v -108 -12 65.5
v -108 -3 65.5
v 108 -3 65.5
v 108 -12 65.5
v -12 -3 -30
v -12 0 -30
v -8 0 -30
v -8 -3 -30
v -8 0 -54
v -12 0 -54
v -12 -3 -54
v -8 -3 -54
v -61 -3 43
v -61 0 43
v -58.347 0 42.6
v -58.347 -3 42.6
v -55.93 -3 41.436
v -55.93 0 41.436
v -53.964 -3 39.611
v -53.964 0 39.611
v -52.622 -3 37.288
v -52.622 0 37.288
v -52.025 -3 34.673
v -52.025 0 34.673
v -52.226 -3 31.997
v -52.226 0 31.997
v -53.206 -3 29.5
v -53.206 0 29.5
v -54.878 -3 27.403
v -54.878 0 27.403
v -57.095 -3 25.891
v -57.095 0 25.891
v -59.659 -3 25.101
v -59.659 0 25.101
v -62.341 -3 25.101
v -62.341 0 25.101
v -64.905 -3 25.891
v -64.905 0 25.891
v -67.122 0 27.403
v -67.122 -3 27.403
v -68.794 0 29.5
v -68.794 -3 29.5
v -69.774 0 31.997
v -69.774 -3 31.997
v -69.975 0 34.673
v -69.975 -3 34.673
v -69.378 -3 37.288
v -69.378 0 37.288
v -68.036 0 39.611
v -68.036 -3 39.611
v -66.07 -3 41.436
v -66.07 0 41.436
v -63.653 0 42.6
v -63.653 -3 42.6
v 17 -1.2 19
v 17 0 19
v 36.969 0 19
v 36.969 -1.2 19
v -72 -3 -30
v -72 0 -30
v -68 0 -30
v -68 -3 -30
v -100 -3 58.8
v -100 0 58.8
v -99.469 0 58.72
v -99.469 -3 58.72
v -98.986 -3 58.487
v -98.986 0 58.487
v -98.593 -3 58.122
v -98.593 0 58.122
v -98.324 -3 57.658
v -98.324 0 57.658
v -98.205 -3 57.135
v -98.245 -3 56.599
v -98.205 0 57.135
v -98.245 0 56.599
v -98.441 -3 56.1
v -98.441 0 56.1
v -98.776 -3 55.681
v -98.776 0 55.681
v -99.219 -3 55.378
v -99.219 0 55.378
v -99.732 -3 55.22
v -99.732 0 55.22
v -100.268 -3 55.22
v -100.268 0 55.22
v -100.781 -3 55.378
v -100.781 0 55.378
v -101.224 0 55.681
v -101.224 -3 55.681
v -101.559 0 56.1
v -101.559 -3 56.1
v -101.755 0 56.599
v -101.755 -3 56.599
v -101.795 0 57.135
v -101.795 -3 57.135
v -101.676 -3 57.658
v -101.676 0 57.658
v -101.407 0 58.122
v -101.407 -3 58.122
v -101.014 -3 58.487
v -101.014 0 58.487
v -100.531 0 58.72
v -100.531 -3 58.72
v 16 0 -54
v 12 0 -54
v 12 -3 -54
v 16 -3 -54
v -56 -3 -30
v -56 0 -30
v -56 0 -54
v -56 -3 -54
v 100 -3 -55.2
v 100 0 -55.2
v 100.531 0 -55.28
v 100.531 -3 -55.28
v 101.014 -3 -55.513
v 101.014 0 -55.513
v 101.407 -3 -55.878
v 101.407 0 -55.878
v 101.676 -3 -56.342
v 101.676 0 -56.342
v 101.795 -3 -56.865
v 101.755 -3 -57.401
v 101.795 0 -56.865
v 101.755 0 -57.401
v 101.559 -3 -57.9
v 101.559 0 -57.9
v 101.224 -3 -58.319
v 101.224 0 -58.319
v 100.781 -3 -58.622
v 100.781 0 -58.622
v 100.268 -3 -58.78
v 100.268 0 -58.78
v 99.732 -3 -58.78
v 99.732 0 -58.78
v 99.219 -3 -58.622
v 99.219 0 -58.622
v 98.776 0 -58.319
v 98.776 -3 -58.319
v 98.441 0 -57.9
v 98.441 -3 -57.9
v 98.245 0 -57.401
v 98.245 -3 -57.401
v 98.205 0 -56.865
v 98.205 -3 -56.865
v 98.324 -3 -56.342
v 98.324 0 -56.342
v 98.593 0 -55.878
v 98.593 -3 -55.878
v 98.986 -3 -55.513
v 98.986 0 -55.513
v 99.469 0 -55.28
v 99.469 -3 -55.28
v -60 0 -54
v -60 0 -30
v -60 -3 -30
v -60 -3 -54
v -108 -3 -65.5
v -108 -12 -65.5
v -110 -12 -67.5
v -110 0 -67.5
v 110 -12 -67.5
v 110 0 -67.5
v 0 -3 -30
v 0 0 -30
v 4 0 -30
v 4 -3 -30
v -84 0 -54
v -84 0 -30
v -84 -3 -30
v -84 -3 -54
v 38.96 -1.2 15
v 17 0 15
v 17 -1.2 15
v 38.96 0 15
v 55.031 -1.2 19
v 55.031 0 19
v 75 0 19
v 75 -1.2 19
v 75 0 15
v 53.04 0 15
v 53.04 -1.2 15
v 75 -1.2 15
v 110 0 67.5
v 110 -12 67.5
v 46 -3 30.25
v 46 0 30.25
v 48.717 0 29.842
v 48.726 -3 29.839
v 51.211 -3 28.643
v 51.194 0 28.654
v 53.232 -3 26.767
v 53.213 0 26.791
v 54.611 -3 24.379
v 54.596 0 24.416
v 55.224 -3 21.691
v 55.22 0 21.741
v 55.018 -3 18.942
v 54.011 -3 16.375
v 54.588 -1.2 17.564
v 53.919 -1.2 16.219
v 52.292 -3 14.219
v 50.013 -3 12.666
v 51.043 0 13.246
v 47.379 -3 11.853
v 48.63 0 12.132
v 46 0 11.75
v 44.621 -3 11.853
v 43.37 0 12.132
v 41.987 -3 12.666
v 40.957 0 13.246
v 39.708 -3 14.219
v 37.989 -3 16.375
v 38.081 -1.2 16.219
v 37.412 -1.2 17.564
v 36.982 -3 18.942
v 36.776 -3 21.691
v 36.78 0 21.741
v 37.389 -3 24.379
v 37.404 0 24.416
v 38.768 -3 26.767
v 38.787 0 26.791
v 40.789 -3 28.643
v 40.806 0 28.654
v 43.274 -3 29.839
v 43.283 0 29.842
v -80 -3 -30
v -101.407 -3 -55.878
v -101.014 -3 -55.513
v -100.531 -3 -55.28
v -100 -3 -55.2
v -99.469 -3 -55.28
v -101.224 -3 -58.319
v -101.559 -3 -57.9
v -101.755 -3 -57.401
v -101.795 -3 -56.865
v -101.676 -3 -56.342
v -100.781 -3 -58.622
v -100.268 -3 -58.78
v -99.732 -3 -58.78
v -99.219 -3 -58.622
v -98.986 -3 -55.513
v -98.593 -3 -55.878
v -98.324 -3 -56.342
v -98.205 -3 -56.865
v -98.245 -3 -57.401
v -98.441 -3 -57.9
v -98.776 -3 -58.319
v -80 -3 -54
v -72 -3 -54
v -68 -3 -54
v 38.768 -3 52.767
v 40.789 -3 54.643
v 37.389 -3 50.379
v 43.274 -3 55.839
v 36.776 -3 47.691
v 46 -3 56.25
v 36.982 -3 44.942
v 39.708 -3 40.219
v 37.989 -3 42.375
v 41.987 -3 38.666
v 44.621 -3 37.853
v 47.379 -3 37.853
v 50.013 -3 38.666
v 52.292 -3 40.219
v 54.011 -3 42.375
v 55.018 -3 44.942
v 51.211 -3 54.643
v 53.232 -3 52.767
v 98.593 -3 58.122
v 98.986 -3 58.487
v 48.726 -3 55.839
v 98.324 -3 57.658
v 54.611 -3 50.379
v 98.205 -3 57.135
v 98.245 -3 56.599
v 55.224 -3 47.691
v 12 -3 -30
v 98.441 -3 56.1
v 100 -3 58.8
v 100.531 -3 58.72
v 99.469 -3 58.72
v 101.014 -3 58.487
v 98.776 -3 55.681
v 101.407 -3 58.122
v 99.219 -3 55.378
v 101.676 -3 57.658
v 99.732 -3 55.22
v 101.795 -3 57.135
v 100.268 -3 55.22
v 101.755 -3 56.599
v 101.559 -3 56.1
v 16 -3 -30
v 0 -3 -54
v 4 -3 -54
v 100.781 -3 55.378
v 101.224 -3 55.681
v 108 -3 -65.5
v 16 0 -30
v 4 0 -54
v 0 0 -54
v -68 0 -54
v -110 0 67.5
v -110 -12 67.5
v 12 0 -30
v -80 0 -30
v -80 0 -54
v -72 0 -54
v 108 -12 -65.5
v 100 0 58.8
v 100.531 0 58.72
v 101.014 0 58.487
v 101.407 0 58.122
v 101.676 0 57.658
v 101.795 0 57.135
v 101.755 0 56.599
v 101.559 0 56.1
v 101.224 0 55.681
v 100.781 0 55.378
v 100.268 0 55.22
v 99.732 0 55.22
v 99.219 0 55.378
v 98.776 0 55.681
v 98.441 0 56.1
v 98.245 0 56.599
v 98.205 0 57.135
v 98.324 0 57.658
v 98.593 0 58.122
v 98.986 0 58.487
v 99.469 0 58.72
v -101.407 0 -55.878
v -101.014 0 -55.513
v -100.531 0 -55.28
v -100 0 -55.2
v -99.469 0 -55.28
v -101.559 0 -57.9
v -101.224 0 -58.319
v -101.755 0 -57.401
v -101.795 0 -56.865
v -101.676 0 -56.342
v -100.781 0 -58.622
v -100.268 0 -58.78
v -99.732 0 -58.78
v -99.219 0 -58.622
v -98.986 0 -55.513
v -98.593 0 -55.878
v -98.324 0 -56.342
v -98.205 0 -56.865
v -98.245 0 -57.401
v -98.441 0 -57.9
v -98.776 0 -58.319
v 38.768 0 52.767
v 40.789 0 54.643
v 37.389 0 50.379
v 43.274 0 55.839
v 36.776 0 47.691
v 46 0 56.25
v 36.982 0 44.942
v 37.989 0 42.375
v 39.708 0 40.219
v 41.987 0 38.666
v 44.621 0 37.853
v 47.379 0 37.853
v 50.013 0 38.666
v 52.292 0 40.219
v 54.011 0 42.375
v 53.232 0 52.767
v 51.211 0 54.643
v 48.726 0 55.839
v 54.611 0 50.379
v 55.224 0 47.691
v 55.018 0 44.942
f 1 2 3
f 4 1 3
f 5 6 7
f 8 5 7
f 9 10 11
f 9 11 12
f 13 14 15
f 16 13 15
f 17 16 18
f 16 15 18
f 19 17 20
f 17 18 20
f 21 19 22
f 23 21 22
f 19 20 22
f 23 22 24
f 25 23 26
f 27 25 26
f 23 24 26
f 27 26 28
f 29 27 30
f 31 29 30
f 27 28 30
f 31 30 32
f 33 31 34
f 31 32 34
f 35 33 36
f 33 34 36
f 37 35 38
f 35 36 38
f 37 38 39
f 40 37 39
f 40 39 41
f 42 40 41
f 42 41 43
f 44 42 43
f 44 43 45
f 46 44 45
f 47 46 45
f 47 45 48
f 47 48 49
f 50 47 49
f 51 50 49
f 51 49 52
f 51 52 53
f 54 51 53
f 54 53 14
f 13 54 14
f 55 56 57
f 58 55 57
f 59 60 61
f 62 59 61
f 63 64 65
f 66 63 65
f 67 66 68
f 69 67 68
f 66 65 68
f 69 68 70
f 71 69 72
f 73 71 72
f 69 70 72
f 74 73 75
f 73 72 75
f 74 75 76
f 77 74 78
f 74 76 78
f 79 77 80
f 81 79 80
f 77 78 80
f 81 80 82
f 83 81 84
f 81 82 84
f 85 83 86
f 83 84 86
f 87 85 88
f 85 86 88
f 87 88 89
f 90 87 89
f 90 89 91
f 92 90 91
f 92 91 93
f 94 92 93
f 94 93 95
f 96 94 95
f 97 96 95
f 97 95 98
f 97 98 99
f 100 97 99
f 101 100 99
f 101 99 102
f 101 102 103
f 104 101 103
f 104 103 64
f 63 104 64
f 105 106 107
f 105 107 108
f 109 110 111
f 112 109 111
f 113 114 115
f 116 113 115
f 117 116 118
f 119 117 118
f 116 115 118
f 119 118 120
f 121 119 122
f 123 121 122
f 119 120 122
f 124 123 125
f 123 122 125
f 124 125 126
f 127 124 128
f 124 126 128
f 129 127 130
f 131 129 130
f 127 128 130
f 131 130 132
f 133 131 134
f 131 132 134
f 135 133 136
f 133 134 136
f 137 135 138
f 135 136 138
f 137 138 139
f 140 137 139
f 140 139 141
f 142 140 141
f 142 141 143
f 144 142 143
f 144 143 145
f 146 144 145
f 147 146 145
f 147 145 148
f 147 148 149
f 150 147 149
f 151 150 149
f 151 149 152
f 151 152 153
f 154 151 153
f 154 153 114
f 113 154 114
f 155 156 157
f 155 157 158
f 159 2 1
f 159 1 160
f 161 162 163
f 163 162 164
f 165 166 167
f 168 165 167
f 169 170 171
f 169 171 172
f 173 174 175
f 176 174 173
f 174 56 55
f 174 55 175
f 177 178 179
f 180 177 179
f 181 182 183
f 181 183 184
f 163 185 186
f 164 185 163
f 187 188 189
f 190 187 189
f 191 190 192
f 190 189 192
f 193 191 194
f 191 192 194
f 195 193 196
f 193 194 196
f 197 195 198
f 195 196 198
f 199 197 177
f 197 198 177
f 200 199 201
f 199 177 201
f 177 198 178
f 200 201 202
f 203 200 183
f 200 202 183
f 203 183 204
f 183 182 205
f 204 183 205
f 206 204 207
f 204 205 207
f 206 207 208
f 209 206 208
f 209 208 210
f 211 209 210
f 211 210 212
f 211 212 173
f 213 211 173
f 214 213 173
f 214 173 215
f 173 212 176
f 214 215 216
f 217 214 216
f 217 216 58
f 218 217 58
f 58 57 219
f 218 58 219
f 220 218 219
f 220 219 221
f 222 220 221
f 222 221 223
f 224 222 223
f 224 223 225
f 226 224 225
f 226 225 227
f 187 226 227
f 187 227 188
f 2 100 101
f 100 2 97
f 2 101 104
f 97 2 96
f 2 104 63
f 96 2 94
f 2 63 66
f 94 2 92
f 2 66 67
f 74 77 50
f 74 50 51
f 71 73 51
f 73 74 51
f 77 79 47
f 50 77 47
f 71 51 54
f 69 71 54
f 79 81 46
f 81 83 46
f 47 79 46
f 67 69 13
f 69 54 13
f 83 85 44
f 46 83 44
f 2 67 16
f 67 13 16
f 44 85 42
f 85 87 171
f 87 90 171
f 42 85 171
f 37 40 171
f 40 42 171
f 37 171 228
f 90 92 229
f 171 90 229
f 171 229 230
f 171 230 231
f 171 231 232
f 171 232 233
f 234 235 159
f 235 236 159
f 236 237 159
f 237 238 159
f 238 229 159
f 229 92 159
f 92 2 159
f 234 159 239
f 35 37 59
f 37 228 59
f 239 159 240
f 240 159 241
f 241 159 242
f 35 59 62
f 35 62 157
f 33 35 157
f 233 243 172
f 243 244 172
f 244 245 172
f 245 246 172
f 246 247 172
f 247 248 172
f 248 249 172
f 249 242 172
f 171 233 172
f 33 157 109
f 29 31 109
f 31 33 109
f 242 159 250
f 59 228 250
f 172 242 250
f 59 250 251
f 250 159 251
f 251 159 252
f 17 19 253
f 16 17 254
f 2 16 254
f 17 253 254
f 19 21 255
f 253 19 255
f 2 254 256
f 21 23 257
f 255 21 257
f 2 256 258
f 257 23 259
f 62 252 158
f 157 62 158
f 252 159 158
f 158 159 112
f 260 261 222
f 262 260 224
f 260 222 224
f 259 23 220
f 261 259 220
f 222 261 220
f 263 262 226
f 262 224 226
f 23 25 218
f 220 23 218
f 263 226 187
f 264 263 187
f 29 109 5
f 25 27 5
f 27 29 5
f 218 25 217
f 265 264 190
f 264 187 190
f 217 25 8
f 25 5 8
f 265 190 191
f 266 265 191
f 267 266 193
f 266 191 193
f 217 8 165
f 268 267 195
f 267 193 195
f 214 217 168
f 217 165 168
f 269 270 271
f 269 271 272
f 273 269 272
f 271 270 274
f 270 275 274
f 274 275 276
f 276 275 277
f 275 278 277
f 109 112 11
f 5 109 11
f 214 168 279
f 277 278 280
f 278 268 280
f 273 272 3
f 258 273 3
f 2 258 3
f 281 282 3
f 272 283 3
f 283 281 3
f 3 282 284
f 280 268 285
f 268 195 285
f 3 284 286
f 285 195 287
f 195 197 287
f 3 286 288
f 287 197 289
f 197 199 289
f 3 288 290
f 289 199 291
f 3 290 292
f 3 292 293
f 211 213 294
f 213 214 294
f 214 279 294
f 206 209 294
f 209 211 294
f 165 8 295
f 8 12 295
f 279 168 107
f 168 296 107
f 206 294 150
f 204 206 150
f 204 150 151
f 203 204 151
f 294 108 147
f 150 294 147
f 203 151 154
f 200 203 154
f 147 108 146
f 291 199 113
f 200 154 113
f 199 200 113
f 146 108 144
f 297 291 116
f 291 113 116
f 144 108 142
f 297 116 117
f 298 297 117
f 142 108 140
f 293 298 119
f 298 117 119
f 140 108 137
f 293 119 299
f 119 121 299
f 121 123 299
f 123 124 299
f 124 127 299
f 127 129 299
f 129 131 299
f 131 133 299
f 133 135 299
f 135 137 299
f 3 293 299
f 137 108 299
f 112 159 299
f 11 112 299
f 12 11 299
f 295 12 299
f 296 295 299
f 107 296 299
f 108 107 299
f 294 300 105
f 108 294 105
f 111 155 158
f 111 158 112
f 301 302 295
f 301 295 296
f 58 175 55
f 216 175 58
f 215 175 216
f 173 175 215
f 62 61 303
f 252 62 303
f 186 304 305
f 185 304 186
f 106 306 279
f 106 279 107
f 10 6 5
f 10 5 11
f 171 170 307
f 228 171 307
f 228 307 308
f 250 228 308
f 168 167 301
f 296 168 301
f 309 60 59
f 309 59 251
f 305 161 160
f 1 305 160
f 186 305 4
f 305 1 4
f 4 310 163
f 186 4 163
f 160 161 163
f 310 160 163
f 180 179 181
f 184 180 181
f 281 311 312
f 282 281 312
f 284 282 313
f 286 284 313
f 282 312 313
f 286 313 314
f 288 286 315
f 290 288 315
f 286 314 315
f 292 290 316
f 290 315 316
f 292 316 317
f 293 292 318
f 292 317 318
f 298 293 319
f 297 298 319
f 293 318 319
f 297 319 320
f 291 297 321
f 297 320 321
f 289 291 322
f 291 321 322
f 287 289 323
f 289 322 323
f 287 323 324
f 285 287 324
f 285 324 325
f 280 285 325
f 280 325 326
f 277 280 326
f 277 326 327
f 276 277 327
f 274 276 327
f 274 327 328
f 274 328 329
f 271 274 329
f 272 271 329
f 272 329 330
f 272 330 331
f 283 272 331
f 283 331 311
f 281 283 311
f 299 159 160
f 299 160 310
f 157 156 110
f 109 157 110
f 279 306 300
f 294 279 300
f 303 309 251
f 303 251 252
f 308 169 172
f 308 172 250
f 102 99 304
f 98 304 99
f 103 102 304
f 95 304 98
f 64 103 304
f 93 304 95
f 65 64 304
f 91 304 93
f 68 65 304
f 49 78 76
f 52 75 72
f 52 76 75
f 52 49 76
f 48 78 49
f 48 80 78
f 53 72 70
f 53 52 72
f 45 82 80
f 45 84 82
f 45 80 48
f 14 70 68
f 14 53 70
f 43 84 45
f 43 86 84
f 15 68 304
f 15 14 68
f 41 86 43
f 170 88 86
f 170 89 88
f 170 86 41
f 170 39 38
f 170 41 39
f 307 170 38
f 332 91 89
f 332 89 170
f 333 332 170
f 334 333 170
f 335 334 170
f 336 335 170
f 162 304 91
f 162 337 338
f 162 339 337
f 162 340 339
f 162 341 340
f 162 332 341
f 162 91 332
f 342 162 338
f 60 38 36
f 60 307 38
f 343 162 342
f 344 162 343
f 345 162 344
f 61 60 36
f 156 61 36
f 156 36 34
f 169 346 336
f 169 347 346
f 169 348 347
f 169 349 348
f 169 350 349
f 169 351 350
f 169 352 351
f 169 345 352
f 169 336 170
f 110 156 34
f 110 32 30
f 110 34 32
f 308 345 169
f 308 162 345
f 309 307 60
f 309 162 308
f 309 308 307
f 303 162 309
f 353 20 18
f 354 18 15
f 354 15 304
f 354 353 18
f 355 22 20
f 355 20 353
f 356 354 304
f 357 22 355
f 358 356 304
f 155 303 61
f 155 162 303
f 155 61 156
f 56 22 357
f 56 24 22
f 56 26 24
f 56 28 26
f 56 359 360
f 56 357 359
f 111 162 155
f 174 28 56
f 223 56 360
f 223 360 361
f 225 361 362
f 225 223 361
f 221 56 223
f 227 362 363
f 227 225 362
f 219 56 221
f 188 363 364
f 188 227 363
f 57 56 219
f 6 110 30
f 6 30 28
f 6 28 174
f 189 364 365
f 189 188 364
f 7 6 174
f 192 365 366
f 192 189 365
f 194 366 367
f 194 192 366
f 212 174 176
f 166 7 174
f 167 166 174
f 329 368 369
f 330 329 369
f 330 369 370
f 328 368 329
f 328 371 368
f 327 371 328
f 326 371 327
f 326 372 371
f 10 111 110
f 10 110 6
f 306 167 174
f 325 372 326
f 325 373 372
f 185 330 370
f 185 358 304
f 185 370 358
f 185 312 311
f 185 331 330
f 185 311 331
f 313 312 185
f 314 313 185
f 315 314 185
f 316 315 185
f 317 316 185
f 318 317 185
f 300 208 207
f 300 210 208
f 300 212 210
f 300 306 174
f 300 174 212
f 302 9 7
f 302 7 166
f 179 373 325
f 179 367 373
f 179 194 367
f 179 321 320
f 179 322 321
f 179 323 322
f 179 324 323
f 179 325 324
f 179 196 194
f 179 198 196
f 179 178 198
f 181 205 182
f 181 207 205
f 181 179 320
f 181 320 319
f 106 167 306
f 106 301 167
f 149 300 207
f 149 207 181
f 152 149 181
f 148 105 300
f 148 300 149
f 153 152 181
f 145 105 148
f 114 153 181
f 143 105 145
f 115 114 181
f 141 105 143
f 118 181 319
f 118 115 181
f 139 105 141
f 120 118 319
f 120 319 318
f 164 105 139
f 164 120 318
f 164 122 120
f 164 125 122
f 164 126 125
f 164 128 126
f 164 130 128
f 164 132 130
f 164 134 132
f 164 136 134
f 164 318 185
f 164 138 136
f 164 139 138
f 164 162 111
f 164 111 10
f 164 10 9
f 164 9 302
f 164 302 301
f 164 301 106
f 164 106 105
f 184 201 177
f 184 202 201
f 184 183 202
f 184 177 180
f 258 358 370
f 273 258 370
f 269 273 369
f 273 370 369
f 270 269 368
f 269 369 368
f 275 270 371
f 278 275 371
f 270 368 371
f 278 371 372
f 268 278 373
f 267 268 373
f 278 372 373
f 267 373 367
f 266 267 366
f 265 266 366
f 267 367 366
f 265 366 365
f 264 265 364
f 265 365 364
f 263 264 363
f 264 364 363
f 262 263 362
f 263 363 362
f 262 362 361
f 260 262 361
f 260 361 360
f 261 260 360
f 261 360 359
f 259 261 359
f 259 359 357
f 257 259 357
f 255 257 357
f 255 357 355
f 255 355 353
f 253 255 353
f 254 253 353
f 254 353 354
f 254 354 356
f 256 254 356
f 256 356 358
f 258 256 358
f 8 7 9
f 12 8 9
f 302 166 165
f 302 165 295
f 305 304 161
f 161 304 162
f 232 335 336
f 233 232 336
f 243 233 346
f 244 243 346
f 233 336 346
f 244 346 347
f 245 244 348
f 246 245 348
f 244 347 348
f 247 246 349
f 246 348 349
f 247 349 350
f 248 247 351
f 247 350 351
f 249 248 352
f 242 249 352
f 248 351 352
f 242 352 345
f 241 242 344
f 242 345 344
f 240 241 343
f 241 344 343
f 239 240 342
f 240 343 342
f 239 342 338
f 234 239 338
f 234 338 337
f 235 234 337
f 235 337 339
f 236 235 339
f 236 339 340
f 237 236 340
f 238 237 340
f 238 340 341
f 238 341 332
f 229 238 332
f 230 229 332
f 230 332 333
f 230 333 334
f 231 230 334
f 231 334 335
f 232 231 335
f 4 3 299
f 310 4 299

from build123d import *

# Parameters (mm, degrees)
SKETCH_1_W                       = 220
SKETCH_1_H                       = 135
LID_TOP_3MM_DEPTH                = 3
SKETCH_2_W                       = 216
SKETCH_2_H                       = 2
LID_RIM_BACK_DEPTH               = 12
SKETCH_3_W                       = 216
SKETCH_3_H                       = 2
LID_RIM_FRONT_DEPTH              = 12
SKETCH_4_W                       = 2
SKETCH_4_H                       = 135
LID_RIM_LEFT_DEPTH               = 12
SKETCH_5_W                       = 2
SKETCH_5_H                       = 135
LID_RIM_RIGHT_DEPTH              = 12
SKETCH_6_R                       = 1.8
LID_SCREW_CLEARANCE_1_DEPTH      = 16
SKETCH_7_R                       = 1.8
LID_SCREW_CLEARANCE_2_DEPTH      = 16
SKETCH_8_R                       = 1.8
LID_SCREW_CLEARANCE_3_DEPTH      = 16
SKETCH_9_R                       = 1.8
LID_SCREW_CLEARANCE_4_DEPTH      = 16
SKETCH_10_R                      = 9
OV5647_LENS_OPENING_D18_DEPTH    = 4
SKETCH_11_R                      = 9.25
HC_SR04_ACOUSTIC_OPENING_1_DEPTH = 4
SKETCH_12_R                      = 9.25
HC_SR04_ACOUSTIC_OPENING_2_DEPTH = 4
SKETCH_13_W                      = 58
SKETCH_13_H                      = 4
HC_SR04_ALIGNMENT_RECESS_DEPTH   = 1.2
SKETCH_14_W                      = 4
SKETCH_14_H                      = 24
VENT_SLOT_1_DEPTH                = 4
SKETCH_15_W                      = 4
SKETCH_15_H                      = 24
VENT_SLOT_2_DEPTH                = 4
SKETCH_16_W                      = 4
SKETCH_16_H                      = 24
VENT_SLOT_3_DEPTH                = 4
SKETCH_17_W                      = 4
SKETCH_17_H                      = 24
VENT_SLOT_4_DEPTH                = 4
SKETCH_18_W                      = 4
SKETCH_18_H                      = 24
VENT_SLOT_5_DEPTH                = 4
SKETCH_19_W                      = 4
SKETCH_19_H                      = 24
VENT_SLOT_6_DEPTH                = 4


with BuildPart() as part:
    # 草图1 → Lid_Top_3mm (new body)
    with BuildSketch(Plane(origin=(0, 0, 0), x_dir=(1, 0, 0), z_dir=(0, 1, 0))):
        Rectangle(SKETCH_1_W, SKETCH_1_H)
    extrude(amount=-LID_TOP_3MM_DEPTH)

    # 草图2 → Lid_Rim_Back (add)
    with BuildSketch(Plane(origin=(0, 0, 0), x_dir=(1, 0, 0), z_dir=(0, 1, 0))):
        with Locations((0, 66.5)):
            Rectangle(SKETCH_2_W, SKETCH_2_H)
    extrude(amount=-LID_RIM_BACK_DEPTH)

    # 草图3 → Lid_Rim_Front (add)
    with BuildSketch(Plane(origin=(0, 0, 0), x_dir=(1, 0, 0), z_dir=(0, 1, 0))):
        with Locations((0, -66.5)):
            Rectangle(SKETCH_3_W, SKETCH_3_H)
    extrude(amount=-LID_RIM_FRONT_DEPTH)

    # 草图4 → Lid_Rim_Left (add)
    with BuildSketch(Plane(origin=(0, 0, 0), x_dir=(1, 0, 0), z_dir=(0, 1, 0))):
        with Locations((-109, 0)):
            Rectangle(SKETCH_4_W, SKETCH_4_H)
    extrude(amount=-LID_RIM_LEFT_DEPTH)

    # 草图5 → Lid_Rim_Right (add)
    with BuildSketch(Plane(origin=(0, 0, 0), x_dir=(1, 0, 0), z_dir=(0, 1, 0))):
        with Locations((109, 0)):
            Rectangle(SKETCH_5_W, SKETCH_5_H)
    extrude(amount=-LID_RIM_RIGHT_DEPTH)

    # 草图6 → Lid_Screw_Clearance_1 (cut)
    with BuildSketch(Plane(origin=(0, 0, 0), x_dir=(1, 0, 0), z_dir=(0, 1, 0))):
        with Locations(Location((-100, -57, 0), (0, 0, 270))):
            Circle(SKETCH_6_R)
    extrude(amount=-LID_SCREW_CLEARANCE_1_DEPTH, mode=Mode.SUBTRACT)

    # 草图7 → Lid_Screw_Clearance_2 (cut)
    with BuildSketch(Plane(origin=(0, 0, 0), x_dir=(1, 0, 0), z_dir=(0, 1, 0))):
        with Locations(Location((100, -57, 0), (0, 0, 270))):
            Circle(SKETCH_7_R)
    extrude(amount=-LID_SCREW_CLEARANCE_2_DEPTH, mode=Mode.SUBTRACT)

    # 草图8 → Lid_Screw_Clearance_3 (cut)
    with BuildSketch(Plane(origin=(0, 0, 0), x_dir=(1, 0, 0), z_dir=(0, 1, 0))):
        with Locations(Location((-100, 57, 0), (0, 0, 270))):
            Circle(SKETCH_8_R)
    extrude(amount=-LID_SCREW_CLEARANCE_3_DEPTH, mode=Mode.SUBTRACT)

    # 草图9 → Lid_Screw_Clearance_4 (cut)
    with BuildSketch(Plane(origin=(0, 0, 0), x_dir=(1, 0, 0), z_dir=(0, 1, 0))):
        with Locations(Location((100, 57, 0), (0, 0, 270))):
            Circle(SKETCH_9_R)
    extrude(amount=-LID_SCREW_CLEARANCE_4_DEPTH, mode=Mode.SUBTRACT)

    # 草图10 → OV5647_Lens_Opening_D18 (cut)
    with BuildSketch(Plane(origin=(0, 0, 0), x_dir=(1, 0, 0), z_dir=(0, 1, 0))):
        with Locations(Location((-61, -34, 0), (0, 0, 270))):
            Circle(SKETCH_10_R)
    extrude(amount=-OV5647_LENS_OPENING_D18_DEPTH, mode=Mode.SUBTRACT)

    # 草图11 → HC_SR04_Acoustic_Opening_1 (cut)
    with BuildSketch(Plane(origin=(0, 0, 0), x_dir=(1, 0, 0), z_dir=(0, 1, 0))):
        with Locations(Location((46, -47, 0), (0, 0, 270))):
            Circle(SKETCH_11_R)
    extrude(amount=-HC_SR04_ACOUSTIC_OPENING_1_DEPTH, mode=Mode.SUBTRACT)

    # 草图12 → HC_SR04_Acoustic_Opening_2 (cut)
    with BuildSketch(Plane(origin=(0, 0, 0), x_dir=(1, 0, 0), z_dir=(0, 1, 0))):
        with Locations(Location((46, -21, 0), (0, 0, 270))):
            Circle(SKETCH_12_R)
    extrude(amount=-HC_SR04_ACOUSTIC_OPENING_2_DEPTH, mode=Mode.SUBTRACT)

    # 草图13 → HC_SR04_Alignment_Recess (cut)
    with BuildSketch(Plane(origin=(0, 0, 0), x_dir=(1, 0, 0), z_dir=(0, 1, 0))):
        with Locations((46, -17)):
            Rectangle(SKETCH_13_W, SKETCH_13_H)
    extrude(amount=-HC_SR04_ALIGNMENT_RECESS_DEPTH, mode=Mode.SUBTRACT)

    # 草图14 → Vent_Slot_1 (cut)
    with BuildSketch(Plane(origin=(0, 0, 0), x_dir=(1, 0, 0), z_dir=(0, 1, 0))):
        with Locations((-82, 42)):
            Rectangle(SKETCH_14_W, SKETCH_14_H)
    extrude(amount=-VENT_SLOT_1_DEPTH, mode=Mode.SUBTRACT)

    # 草图15 → Vent_Slot_2 (cut)
    with BuildSketch(Plane(origin=(0, 0, 0), x_dir=(1, 0, 0), z_dir=(0, 1, 0))):
        with Locations((-70, 42)):
            Rectangle(SKETCH_15_W, SKETCH_15_H)
    extrude(amount=-VENT_SLOT_2_DEPTH, mode=Mode.SUBTRACT)

    # 草图16 → Vent_Slot_3 (cut)
    with BuildSketch(Plane(origin=(0, 0, 0), x_dir=(1, 0, 0), z_dir=(0, 1, 0))):
        with Locations((-58, 42)):
            Rectangle(SKETCH_16_W, SKETCH_16_H)
    extrude(amount=-VENT_SLOT_3_DEPTH, mode=Mode.SUBTRACT)

    # 草图17 → Vent_Slot_4 (cut)
    with BuildSketch(Plane(origin=(0, 0, 0), x_dir=(1, 0, 0), z_dir=(0, 1, 0))):
        with Locations((-10, 42)):
            Rectangle(SKETCH_17_W, SKETCH_17_H)
    extrude(amount=-VENT_SLOT_4_DEPTH, mode=Mode.SUBTRACT)

    # 草图18 → Vent_Slot_5 (cut)
    with BuildSketch(Plane(origin=(0, 0, 0), x_dir=(1, 0, 0), z_dir=(0, 1, 0))):
        with Locations((2, 42)):
            Rectangle(SKETCH_18_W, SKETCH_18_H)
    extrude(amount=-VENT_SLOT_5_DEPTH, mode=Mode.SUBTRACT)

    # 草图19 → Vent_Slot_6 (cut)
    with BuildSketch(Plane(origin=(0, 0, 0), x_dir=(1, 0, 0), z_dir=(0, 1, 0))):
        with Locations((14, 42)):
            Rectangle(SKETCH_19_W, SKETCH_19_H)
    extrude(amount=-VENT_SLOT_6_DEPTH, mode=Mode.SUBTRACT)


solid = part.part
